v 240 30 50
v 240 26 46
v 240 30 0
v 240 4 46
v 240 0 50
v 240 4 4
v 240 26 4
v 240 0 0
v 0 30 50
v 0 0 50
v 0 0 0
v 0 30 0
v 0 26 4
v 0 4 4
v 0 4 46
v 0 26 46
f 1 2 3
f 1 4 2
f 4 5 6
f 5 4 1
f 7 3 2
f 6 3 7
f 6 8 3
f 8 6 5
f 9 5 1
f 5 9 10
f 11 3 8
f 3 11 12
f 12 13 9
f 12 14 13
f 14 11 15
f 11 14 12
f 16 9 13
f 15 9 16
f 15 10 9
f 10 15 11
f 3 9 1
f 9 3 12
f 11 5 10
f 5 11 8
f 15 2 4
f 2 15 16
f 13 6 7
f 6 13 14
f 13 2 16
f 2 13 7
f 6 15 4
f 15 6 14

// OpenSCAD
$fn = 32;

// ----------------------------------------------------------------------
// Box beam: 200-250 mm hollow beam
// ----------------------------------------------------------------------

// --- parameters (mm) ---
beam_l = 240;             // beam length, X
beam_w = 30;              // beam width, Y
beam_h = 50;              // beam height, Z
wall = 4;                 // wall thickness

difference() {
  cube([beam_l, beam_w, beam_h]);
  translate([-1, wall, wall])
    cube([beam_l + 2, beam_w - 2 * wall, beam_h - 2 * wall]);
}
